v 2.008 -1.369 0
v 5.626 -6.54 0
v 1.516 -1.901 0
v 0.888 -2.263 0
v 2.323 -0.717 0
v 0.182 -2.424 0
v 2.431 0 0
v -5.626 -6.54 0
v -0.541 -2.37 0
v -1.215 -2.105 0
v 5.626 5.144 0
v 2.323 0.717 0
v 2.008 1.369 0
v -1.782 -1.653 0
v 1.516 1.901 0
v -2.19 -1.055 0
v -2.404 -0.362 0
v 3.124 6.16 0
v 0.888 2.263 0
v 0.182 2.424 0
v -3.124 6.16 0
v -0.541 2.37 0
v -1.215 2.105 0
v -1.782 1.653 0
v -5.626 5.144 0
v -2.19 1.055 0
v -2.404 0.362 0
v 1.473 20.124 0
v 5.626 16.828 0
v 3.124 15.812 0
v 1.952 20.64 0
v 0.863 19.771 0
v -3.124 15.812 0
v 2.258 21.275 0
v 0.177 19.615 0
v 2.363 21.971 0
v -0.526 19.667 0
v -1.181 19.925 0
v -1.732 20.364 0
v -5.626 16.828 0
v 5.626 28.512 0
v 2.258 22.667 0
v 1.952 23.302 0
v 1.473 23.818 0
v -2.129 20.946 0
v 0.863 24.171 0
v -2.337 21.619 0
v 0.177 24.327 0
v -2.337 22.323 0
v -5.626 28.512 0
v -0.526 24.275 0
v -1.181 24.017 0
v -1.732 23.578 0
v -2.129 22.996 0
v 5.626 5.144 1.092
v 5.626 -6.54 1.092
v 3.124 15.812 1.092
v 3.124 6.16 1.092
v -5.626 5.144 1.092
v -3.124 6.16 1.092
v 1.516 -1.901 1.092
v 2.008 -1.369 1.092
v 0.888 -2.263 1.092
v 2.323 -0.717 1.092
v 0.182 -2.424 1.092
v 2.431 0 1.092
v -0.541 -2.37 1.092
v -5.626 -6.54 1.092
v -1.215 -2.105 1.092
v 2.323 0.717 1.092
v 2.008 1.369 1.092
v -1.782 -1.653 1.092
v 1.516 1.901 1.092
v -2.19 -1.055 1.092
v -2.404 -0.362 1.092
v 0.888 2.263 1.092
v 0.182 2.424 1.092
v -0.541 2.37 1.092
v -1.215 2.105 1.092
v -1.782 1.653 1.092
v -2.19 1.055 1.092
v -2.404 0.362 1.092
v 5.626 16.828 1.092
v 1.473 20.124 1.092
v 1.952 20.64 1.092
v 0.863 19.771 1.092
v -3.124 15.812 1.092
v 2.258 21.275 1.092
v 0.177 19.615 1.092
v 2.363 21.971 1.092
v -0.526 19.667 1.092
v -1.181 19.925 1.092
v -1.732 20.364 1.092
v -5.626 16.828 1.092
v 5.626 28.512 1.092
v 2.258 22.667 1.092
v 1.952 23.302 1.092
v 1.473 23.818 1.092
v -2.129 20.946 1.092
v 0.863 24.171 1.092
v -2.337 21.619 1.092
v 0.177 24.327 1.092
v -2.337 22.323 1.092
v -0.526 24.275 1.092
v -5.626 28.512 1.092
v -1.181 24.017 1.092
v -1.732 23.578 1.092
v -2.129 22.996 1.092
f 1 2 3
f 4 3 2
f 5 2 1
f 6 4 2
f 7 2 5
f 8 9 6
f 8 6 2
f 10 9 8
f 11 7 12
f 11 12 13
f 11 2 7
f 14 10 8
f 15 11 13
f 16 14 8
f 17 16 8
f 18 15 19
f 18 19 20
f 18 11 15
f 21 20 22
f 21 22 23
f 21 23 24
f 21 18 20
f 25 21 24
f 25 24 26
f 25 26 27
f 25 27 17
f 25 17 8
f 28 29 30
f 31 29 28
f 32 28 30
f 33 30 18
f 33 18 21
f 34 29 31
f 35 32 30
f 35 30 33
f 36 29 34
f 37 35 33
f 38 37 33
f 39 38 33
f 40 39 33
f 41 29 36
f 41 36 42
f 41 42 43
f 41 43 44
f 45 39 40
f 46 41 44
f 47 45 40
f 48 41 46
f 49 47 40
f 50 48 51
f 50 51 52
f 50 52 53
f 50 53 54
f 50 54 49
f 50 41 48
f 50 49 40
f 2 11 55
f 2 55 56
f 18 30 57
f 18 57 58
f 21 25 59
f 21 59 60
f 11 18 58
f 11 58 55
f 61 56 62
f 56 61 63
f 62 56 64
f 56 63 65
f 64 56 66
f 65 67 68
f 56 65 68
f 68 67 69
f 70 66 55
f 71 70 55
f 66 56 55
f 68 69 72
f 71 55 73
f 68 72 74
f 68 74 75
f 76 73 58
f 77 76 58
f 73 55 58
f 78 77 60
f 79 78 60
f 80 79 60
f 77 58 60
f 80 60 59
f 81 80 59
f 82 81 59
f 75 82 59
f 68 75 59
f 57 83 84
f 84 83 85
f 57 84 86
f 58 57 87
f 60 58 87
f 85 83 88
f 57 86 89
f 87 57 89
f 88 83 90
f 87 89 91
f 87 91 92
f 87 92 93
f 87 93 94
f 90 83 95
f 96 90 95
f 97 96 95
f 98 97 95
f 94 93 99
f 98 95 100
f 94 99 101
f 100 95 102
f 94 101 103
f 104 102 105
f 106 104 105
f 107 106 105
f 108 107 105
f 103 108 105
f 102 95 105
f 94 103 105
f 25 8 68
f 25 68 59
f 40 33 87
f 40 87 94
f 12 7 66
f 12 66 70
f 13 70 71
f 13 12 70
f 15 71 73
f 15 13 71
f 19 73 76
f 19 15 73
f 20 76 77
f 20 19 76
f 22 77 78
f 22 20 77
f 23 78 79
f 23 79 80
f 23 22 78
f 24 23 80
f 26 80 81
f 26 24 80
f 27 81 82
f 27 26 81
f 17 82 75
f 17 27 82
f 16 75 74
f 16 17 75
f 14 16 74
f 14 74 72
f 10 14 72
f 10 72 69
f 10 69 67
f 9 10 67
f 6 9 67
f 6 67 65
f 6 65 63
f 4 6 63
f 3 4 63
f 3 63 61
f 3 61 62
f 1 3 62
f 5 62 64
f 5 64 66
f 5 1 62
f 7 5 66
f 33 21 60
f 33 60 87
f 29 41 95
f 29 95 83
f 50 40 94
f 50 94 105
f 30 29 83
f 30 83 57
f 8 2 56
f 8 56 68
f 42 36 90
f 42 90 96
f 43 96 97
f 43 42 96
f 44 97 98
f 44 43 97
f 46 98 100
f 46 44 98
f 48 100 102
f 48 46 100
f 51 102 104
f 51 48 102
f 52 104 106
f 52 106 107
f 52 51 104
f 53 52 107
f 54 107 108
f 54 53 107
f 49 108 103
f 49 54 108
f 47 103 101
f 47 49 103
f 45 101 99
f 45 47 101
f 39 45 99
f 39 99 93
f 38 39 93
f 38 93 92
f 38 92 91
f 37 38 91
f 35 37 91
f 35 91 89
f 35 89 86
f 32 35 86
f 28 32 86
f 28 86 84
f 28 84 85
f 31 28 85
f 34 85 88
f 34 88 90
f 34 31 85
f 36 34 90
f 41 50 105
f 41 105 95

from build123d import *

# Parameters (mm, degrees)
SKETCH1_R           = 2.430870735
SKETCH1_R_2         = 2.36295848
BOSS_EXTRUDE1_DEPTH = 1.0922


with BuildPart() as part:
    # Sketch1 → Boss-Extrude1 (new body)
    with BuildSketch(Plane.XY):
        Polygon((-5.6261, 28.5115), (5.6261, 28.5115), (5.6261, 16.8275), (3.1242, 15.8115), (3.1242, 6.1595), (5.6261, 5.1435), (5.6261, -6.5405), (-5.6261, -6.5405), (-5.6261, 5.1435), (-3.1242, 6.1595), (-3.1242, 15.8115), (-5.6261, 16.8275), align=None)
        Circle(SKETCH1_R, mode=Mode.SUBTRACT)
        with Locations((0, 21.971)):
            Circle(SKETCH1_R_2, mode=Mode.SUBTRACT)
    extrude(amount=BOSS_EXTRUDE1_DEPTH)


solid = part.part
